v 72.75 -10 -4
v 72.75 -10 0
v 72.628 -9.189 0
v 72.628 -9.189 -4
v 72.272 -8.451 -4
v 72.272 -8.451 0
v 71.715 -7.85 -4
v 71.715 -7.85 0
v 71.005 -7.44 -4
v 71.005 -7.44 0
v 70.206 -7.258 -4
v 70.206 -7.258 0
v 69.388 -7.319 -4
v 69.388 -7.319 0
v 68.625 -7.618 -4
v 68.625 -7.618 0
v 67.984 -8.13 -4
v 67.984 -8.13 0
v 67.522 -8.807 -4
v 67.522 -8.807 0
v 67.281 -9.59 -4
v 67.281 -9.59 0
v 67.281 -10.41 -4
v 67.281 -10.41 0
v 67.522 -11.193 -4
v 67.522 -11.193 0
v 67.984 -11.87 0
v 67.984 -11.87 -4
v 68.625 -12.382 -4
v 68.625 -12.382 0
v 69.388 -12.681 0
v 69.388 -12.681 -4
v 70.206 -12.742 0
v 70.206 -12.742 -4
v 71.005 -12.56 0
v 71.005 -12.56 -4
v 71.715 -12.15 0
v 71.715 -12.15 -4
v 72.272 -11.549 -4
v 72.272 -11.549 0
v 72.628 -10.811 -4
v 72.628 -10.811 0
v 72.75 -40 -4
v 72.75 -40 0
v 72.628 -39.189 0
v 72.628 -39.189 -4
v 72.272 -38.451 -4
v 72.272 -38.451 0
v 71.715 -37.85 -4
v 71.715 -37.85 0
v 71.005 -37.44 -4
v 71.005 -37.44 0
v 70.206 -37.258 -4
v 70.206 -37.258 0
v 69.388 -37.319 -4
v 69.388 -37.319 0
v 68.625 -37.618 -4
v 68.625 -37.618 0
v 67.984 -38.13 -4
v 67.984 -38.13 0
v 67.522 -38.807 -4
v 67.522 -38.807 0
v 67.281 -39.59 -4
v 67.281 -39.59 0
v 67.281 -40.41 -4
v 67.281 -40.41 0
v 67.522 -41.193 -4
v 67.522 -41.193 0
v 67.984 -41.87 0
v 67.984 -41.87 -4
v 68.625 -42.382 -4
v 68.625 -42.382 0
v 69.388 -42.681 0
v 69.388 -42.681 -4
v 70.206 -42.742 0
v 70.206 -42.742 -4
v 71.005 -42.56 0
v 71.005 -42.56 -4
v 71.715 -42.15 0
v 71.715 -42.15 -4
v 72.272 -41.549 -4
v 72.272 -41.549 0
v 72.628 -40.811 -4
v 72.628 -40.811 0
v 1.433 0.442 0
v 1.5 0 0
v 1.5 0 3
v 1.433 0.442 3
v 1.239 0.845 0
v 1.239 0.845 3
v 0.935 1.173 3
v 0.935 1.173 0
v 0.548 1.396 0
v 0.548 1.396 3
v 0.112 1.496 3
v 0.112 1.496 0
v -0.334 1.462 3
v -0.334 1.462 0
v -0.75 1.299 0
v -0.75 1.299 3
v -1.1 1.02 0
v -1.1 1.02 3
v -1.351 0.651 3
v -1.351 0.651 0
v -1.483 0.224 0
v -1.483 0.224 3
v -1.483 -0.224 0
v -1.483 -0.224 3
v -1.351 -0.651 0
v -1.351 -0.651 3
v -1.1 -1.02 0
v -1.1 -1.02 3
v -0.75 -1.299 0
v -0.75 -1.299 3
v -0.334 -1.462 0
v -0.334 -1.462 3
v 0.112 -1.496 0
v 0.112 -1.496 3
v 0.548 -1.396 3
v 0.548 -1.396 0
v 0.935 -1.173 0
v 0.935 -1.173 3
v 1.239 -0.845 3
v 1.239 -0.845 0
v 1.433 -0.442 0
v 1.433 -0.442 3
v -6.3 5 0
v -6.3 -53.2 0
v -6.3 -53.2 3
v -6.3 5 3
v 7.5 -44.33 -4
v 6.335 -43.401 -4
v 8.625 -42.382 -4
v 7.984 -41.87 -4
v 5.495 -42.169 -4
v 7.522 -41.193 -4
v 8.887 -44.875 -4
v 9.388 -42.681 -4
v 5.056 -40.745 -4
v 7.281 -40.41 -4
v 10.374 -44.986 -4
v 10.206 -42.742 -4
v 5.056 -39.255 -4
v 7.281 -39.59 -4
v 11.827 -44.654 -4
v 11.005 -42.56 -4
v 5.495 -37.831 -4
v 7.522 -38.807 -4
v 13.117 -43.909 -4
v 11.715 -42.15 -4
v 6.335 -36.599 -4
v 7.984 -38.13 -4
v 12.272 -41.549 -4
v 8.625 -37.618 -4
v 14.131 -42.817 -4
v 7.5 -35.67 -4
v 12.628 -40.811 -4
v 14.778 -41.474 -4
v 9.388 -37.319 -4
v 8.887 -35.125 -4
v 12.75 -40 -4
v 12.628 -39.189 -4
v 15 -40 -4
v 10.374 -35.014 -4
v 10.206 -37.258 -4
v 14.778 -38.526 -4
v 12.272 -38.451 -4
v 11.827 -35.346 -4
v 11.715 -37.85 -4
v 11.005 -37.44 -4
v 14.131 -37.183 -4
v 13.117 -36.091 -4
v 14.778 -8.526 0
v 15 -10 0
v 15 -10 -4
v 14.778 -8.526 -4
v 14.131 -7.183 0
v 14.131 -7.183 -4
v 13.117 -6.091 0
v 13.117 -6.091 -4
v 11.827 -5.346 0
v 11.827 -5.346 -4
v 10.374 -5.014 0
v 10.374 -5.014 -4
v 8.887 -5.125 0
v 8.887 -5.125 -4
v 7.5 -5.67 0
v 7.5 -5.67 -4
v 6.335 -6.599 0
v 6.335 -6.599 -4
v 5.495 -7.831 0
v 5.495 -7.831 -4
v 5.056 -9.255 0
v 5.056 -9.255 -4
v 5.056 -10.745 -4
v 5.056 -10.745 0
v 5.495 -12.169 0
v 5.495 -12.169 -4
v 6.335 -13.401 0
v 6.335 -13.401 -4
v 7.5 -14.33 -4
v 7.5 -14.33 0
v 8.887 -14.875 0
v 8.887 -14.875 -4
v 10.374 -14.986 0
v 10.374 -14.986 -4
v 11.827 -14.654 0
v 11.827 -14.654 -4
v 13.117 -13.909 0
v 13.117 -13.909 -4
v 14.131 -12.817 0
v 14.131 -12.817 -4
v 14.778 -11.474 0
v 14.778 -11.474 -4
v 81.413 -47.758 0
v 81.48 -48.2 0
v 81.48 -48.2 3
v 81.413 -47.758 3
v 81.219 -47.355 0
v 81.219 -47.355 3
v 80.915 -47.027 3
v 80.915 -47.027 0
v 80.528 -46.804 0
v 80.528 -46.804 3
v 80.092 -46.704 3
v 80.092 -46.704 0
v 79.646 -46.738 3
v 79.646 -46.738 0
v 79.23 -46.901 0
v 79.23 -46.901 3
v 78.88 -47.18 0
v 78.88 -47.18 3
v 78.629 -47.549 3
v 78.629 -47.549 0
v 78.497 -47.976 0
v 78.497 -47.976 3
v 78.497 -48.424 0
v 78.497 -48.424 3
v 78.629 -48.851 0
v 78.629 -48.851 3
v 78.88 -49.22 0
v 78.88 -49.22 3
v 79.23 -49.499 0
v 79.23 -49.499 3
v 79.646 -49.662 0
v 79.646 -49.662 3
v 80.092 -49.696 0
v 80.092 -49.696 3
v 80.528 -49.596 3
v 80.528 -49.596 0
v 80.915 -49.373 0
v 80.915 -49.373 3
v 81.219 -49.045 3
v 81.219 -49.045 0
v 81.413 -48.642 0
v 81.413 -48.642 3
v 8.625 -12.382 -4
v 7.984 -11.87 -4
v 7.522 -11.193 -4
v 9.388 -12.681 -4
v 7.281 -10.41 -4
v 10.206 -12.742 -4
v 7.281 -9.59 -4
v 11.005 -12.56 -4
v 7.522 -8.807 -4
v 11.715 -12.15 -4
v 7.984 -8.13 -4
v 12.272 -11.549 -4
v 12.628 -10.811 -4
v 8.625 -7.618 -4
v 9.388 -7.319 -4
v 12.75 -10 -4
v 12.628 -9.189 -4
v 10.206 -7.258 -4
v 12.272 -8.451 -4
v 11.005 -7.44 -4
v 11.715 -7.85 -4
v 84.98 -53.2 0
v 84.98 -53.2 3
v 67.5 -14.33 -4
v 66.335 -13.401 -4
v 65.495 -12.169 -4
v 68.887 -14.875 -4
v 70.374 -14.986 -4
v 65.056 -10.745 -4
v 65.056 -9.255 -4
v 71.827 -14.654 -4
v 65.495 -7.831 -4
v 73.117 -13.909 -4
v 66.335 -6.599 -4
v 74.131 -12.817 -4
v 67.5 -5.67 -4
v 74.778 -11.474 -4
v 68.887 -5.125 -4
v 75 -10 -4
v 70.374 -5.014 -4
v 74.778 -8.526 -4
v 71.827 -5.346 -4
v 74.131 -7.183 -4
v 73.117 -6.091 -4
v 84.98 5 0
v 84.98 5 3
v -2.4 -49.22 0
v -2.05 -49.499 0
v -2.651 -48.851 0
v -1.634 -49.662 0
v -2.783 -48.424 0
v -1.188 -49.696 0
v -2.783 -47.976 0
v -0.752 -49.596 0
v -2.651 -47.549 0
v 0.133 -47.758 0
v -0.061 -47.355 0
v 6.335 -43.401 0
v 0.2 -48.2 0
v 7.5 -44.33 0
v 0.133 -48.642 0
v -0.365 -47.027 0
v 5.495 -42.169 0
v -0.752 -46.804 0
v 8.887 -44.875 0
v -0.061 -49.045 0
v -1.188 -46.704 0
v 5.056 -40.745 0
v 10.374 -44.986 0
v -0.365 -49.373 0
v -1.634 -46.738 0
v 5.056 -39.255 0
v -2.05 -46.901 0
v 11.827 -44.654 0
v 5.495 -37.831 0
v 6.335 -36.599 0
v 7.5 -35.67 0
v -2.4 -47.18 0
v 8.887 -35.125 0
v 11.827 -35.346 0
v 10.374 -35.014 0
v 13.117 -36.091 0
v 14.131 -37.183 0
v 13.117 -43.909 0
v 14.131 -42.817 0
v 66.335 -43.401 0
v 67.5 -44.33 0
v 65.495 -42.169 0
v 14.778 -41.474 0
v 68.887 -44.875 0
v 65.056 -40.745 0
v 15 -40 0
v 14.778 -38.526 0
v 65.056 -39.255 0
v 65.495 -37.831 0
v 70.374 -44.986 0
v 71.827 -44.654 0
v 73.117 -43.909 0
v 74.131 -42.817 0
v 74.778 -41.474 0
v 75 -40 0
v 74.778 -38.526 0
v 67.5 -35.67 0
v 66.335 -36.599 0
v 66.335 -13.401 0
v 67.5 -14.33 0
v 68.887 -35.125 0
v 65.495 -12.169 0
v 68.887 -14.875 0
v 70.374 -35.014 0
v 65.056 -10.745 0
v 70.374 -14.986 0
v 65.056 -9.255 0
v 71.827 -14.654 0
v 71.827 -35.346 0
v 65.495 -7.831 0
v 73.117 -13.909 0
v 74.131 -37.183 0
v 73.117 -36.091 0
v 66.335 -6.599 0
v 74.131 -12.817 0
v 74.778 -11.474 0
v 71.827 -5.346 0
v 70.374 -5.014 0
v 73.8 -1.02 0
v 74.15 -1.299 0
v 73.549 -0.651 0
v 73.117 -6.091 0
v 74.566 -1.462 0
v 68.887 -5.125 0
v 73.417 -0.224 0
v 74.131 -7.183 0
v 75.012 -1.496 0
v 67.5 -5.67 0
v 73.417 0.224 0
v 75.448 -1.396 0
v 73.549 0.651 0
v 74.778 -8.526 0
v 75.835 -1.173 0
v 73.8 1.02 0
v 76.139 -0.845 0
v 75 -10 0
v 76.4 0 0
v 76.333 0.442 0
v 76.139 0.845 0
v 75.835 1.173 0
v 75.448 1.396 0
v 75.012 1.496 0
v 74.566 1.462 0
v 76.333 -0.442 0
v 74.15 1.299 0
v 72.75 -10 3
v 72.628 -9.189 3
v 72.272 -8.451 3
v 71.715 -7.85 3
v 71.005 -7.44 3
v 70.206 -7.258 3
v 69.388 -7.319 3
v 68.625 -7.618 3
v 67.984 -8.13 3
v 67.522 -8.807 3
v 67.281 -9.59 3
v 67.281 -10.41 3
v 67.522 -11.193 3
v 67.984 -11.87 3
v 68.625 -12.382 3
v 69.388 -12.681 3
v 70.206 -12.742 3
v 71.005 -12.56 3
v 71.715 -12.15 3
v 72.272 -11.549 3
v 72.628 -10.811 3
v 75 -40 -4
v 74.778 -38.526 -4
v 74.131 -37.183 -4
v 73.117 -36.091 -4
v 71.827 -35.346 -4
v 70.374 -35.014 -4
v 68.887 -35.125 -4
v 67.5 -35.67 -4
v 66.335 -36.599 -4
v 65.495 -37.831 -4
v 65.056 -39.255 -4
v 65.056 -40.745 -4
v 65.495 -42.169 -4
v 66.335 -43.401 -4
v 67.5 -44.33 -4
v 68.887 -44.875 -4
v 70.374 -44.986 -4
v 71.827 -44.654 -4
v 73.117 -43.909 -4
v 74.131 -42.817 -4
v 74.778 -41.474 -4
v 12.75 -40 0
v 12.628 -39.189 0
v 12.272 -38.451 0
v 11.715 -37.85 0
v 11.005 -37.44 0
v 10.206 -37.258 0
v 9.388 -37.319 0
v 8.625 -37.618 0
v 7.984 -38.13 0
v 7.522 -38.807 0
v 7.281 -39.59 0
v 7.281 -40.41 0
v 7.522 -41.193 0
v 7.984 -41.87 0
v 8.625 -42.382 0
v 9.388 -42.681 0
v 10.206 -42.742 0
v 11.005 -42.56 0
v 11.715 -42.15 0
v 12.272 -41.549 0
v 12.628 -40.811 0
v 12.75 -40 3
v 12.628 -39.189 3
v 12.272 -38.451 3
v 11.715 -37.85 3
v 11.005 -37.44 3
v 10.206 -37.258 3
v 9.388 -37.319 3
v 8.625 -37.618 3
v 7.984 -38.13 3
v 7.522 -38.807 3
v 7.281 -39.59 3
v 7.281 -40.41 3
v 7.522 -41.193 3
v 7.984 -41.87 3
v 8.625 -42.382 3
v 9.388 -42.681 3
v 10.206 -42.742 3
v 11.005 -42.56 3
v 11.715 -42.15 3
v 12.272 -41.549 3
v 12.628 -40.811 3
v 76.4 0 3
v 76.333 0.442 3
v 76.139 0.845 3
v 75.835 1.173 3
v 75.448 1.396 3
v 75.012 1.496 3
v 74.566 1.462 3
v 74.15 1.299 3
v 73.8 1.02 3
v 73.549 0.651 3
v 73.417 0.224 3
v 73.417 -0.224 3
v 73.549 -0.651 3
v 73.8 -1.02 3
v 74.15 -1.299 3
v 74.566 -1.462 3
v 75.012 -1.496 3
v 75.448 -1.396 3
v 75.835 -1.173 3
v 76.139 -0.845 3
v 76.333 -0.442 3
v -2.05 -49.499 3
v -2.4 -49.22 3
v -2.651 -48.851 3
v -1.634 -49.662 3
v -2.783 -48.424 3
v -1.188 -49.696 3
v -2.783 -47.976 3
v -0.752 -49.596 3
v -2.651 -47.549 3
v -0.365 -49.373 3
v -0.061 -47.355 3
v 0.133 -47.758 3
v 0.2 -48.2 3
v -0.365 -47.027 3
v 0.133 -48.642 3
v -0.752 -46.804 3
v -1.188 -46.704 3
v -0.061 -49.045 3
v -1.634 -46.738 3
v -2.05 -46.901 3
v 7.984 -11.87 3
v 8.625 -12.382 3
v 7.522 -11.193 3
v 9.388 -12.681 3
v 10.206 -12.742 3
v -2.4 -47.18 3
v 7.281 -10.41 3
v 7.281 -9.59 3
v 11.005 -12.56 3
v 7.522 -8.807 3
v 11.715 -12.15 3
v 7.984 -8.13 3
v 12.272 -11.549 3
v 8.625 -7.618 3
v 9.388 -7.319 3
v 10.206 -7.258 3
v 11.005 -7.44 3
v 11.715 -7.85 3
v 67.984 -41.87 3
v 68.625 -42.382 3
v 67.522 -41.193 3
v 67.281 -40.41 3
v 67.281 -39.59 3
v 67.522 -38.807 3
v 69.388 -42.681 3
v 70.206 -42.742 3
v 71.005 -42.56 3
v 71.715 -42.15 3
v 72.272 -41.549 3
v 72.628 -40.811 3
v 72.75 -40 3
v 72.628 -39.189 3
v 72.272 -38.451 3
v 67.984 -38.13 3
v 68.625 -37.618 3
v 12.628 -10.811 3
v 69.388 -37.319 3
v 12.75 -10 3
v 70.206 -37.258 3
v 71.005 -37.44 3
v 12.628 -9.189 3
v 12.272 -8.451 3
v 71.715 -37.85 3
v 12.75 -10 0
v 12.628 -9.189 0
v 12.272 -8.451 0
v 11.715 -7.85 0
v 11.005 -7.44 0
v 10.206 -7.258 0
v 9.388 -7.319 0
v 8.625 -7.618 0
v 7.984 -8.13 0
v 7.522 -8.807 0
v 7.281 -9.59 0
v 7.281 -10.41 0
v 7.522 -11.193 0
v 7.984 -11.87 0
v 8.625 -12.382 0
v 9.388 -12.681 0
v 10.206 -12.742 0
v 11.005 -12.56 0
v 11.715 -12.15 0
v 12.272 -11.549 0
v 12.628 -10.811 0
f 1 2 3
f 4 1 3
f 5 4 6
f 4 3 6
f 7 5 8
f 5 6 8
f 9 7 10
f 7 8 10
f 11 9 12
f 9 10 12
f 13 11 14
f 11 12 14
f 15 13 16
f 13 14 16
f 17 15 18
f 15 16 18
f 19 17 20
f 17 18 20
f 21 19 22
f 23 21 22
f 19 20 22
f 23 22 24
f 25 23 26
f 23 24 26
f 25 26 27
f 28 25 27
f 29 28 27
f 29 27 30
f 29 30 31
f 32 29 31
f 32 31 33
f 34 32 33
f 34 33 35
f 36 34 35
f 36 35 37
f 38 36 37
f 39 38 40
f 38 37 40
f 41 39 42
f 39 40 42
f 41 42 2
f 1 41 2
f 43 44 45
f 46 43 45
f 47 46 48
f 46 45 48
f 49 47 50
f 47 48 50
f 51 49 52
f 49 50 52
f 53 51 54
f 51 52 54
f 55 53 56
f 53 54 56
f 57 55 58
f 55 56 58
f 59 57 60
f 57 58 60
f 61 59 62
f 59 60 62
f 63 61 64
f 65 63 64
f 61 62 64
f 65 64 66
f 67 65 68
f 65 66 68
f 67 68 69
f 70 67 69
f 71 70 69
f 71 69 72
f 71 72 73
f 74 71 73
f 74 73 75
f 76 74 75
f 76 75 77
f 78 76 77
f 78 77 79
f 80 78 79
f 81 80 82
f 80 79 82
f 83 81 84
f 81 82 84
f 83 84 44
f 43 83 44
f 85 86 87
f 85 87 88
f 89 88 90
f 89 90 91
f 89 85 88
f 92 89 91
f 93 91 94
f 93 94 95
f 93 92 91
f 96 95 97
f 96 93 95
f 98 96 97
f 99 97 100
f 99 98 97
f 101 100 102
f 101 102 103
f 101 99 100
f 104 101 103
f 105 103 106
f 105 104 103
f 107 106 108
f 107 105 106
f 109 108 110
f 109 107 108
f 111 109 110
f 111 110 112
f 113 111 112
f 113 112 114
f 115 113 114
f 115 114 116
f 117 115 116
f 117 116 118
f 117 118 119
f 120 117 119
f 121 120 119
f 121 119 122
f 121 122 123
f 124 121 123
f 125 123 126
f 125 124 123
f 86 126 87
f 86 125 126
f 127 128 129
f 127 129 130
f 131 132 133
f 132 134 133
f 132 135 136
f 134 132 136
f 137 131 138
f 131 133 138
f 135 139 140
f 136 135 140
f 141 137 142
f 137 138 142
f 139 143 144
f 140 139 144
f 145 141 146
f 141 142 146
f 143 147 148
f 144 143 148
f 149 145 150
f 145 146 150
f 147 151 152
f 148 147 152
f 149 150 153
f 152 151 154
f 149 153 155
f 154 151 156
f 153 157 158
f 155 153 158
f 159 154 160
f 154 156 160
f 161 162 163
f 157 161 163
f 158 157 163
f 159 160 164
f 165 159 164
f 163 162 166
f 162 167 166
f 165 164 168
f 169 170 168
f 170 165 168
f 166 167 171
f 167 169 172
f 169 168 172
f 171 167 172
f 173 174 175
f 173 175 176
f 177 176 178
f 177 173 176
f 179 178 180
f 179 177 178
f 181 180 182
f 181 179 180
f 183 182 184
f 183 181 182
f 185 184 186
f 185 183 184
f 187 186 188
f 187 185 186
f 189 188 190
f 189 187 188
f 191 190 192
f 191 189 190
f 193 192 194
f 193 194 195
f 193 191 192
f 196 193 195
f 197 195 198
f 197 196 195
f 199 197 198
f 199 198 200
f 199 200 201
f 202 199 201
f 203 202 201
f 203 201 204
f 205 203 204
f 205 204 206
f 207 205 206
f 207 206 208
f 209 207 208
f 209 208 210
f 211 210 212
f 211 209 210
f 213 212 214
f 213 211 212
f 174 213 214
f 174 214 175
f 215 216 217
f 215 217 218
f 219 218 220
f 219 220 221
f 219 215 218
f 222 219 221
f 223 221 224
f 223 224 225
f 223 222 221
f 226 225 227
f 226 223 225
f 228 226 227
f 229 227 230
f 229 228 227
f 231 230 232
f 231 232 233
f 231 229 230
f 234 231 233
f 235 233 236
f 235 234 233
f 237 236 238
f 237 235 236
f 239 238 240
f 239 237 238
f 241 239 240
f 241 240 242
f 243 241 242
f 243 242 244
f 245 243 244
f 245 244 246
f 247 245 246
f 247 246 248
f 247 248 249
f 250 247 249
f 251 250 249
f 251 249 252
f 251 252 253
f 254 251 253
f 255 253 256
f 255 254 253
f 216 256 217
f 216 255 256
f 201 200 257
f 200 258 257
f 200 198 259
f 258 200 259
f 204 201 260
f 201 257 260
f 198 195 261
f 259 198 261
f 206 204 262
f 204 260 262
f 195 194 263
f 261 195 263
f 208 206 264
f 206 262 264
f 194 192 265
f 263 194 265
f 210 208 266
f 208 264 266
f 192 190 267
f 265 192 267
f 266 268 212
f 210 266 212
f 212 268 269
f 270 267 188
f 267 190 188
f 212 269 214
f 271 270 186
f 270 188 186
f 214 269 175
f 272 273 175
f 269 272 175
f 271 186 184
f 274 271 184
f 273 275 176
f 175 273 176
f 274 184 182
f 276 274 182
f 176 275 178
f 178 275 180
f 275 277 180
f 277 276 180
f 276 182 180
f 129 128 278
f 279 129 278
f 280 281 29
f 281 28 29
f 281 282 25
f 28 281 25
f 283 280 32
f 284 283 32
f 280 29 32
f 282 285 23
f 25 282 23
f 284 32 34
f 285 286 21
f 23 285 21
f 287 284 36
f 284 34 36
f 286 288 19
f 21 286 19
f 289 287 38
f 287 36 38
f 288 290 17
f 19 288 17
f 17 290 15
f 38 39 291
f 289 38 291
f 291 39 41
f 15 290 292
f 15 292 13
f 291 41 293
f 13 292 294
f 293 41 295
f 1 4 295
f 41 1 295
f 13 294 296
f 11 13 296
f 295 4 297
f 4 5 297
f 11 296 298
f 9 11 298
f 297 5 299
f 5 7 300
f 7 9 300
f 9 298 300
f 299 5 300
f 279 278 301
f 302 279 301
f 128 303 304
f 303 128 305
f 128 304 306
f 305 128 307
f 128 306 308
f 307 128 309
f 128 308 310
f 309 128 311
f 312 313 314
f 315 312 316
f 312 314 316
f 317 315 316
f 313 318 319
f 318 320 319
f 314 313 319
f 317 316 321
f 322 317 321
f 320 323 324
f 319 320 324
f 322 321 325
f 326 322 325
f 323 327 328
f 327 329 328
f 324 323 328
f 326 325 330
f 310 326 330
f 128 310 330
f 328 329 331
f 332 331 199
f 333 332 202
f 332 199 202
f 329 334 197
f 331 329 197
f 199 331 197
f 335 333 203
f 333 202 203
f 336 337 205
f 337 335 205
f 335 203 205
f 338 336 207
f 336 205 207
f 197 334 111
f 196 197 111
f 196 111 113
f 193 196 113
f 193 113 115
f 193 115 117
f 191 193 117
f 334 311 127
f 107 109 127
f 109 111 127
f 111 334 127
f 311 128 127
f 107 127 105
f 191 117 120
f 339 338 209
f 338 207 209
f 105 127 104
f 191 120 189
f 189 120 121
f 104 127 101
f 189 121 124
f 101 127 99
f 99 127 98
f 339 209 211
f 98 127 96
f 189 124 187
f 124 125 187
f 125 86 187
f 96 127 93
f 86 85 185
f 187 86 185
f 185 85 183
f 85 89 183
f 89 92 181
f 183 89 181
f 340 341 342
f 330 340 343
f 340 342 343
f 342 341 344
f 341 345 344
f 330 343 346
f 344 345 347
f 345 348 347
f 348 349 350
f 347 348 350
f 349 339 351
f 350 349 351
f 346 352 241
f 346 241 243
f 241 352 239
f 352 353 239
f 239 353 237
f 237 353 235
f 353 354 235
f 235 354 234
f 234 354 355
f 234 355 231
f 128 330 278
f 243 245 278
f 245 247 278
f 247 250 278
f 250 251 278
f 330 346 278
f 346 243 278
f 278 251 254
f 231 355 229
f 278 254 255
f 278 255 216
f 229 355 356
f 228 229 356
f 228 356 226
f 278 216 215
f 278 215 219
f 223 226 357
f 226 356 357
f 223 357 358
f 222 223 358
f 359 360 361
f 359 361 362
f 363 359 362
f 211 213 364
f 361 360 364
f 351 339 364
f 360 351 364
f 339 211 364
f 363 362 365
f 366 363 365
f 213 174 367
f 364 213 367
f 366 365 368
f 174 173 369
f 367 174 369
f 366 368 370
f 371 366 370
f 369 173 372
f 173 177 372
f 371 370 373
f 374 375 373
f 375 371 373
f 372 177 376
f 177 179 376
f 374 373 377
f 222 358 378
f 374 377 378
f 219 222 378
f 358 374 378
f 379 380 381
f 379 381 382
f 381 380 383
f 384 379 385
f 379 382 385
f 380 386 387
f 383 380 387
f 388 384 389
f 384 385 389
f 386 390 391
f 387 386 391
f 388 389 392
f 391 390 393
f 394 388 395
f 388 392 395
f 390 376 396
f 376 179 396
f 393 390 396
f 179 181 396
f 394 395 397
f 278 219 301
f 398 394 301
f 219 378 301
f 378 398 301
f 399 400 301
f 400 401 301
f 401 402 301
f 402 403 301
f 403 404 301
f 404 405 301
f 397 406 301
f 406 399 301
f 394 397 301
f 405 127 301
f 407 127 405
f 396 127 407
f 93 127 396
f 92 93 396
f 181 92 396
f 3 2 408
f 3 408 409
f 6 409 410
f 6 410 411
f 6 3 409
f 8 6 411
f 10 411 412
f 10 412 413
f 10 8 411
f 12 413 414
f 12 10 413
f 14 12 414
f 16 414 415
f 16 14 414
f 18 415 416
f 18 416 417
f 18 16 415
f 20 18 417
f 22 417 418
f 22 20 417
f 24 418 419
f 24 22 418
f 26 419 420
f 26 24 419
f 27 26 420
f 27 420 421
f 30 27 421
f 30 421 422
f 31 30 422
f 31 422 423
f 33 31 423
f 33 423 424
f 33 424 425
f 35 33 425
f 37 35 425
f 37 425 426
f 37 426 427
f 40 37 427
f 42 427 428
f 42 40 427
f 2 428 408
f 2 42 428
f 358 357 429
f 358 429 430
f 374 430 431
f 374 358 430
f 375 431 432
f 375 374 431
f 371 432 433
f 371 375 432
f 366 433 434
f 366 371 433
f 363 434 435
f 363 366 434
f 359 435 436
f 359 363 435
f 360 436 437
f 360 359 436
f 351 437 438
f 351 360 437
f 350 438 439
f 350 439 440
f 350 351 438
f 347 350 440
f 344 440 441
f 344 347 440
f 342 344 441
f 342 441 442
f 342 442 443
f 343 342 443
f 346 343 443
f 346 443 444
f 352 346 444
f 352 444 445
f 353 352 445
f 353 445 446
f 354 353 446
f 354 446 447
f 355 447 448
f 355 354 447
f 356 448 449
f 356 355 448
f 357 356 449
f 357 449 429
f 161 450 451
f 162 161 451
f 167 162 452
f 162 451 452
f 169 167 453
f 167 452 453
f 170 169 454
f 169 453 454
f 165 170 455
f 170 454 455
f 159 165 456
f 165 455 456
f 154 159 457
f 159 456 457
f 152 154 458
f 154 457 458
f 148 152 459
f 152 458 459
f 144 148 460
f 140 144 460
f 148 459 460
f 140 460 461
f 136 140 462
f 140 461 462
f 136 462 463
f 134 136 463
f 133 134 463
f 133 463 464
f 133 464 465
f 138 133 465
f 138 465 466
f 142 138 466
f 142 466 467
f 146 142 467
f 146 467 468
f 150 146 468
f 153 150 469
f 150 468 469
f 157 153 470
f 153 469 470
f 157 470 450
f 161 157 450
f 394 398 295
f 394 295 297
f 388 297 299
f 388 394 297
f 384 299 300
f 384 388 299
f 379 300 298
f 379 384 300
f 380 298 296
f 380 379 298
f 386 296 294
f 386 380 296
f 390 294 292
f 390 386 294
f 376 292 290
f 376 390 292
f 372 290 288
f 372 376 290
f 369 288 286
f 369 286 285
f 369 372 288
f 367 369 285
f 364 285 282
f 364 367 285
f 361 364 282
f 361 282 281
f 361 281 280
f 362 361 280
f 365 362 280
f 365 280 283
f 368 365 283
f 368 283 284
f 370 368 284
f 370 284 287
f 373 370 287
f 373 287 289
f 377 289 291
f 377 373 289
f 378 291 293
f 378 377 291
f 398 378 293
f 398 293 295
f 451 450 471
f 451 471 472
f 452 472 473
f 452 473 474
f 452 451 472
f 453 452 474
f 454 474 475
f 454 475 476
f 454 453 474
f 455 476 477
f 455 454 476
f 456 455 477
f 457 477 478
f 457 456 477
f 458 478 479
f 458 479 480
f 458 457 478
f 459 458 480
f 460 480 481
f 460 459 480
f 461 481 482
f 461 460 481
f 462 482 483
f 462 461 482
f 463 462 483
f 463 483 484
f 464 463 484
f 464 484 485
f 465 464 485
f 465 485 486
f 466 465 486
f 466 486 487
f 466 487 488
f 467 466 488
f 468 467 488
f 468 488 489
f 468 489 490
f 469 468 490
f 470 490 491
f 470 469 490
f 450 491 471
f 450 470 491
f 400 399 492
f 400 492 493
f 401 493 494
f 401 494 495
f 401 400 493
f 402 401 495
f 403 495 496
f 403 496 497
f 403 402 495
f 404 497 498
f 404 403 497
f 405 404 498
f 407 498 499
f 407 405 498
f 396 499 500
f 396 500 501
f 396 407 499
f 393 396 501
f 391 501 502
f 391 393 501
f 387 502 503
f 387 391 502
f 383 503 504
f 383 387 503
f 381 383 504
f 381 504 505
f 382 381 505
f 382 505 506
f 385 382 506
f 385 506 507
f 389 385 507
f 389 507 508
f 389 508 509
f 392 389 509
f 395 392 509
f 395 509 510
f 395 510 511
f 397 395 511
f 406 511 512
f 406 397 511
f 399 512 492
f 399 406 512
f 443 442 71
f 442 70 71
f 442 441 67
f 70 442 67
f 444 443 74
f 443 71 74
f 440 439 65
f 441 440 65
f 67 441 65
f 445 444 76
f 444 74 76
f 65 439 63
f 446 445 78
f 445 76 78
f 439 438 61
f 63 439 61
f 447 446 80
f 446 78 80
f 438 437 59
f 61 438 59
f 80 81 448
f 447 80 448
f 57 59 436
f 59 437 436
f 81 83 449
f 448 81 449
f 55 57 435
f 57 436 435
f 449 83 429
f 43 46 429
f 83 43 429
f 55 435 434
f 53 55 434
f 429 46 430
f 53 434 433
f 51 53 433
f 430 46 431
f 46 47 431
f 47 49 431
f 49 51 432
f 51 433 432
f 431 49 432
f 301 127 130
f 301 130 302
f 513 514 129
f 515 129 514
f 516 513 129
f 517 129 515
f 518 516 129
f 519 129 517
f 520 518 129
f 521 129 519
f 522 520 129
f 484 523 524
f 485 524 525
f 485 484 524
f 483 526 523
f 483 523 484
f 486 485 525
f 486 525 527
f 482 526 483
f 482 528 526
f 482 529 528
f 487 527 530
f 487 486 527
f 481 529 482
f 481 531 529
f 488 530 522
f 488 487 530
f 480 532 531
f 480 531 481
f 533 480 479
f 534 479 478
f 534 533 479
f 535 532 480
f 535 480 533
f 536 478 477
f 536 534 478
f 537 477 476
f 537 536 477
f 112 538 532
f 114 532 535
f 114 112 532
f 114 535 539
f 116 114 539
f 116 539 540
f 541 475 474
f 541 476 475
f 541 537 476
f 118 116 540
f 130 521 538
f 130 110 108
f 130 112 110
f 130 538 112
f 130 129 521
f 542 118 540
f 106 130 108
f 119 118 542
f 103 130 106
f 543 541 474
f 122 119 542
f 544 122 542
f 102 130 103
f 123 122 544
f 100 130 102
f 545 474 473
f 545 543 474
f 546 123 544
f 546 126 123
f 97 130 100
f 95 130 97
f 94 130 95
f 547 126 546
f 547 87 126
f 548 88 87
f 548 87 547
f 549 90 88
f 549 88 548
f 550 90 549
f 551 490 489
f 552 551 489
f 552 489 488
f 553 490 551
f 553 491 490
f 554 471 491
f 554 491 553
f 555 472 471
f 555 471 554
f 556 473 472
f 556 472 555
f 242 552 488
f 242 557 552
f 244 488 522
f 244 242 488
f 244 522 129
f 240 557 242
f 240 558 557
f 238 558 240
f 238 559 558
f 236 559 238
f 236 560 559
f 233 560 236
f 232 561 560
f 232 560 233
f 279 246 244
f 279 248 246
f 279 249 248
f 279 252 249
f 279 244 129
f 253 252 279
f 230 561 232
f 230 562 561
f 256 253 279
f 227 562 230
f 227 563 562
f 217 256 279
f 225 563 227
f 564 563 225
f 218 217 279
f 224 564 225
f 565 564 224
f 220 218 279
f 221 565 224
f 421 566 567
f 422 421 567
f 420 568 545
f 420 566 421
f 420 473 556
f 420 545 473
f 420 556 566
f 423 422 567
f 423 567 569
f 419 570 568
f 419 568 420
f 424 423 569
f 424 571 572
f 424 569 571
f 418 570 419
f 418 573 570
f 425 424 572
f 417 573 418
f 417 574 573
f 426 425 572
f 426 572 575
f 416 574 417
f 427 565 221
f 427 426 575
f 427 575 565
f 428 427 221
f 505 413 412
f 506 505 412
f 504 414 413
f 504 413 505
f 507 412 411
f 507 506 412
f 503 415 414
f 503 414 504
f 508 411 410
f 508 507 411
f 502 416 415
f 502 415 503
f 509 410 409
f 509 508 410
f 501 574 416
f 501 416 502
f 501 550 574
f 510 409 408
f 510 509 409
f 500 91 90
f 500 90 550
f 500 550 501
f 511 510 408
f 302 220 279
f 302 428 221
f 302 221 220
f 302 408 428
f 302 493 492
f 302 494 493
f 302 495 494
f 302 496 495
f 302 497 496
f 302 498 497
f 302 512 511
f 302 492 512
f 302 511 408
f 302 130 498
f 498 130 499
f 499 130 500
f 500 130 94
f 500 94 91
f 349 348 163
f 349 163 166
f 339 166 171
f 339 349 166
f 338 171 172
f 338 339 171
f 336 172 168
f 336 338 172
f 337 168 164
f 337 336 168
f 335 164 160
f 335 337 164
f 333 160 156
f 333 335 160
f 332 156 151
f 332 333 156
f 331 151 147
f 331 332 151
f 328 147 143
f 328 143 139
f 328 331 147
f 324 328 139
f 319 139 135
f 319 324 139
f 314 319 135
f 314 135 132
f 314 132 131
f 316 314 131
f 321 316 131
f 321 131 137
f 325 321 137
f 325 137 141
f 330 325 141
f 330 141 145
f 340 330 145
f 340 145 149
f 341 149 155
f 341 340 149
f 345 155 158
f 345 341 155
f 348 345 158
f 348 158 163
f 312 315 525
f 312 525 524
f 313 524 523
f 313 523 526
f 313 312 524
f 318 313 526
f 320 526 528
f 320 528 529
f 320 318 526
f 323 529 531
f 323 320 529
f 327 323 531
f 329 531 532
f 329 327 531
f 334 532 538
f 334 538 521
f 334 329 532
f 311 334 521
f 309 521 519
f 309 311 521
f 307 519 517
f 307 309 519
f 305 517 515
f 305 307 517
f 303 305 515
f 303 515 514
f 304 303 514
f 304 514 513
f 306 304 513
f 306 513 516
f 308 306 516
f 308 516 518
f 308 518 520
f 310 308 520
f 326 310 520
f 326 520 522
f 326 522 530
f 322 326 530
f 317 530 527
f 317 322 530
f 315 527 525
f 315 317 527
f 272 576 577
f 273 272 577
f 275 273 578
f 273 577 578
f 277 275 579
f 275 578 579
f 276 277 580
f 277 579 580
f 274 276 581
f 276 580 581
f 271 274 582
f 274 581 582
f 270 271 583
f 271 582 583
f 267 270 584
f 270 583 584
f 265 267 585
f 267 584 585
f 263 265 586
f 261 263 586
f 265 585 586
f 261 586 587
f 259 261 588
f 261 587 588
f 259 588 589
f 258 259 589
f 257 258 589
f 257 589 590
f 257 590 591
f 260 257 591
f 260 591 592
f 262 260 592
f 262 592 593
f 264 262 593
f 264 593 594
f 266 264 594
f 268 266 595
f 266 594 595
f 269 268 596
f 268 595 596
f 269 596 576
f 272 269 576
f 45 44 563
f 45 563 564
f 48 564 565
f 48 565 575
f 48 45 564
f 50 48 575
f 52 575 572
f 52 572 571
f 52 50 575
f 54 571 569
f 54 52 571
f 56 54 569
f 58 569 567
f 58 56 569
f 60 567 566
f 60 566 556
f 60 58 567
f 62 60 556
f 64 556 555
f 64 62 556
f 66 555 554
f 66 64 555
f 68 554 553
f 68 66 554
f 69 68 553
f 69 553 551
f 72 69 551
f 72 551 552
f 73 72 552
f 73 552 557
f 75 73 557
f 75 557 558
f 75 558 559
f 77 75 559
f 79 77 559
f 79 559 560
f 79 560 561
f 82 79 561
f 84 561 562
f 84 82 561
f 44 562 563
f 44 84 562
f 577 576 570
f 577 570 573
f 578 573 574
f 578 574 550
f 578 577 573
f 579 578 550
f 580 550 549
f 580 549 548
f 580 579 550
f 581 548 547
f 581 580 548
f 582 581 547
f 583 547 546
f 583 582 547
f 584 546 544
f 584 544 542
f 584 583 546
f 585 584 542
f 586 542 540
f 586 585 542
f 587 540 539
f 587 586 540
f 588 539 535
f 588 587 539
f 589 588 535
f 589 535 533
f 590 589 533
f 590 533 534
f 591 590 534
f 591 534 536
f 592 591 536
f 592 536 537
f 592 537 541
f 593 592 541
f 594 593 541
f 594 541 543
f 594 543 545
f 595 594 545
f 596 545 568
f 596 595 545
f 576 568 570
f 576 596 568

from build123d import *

# Parameters (mm, degrees)
SKETCH_W      = 91.28
SKETCH_H      = 58.2
SKETCH_R      = 1.5
SKETCH_R_2    = 2.75
PAD_DEPTH     = 3
SKETCH001_R   = 5
SKETCH001_R_2 = 2.75
PAD001_DEPTH  = 4


with BuildPart() as part:
    # Sketch → Pad (new body)
    with BuildSketch(Plane.XY):
        with Locations((39.34, -24.1)):
            Rectangle(SKETCH_W, SKETCH_H)
        Circle(SKETCH_R, mode=Mode.SUBTRACT)
        with Locations((-1.3, -48.2)):
            Circle(SKETCH_R, mode=Mode.SUBTRACT)
        with Locations((74.9, 0)):
            Circle(SKETCH_R, mode=Mode.SUBTRACT)
        with Locations((79.98, -48.2)):
            Circle(SKETCH_R, mode=Mode.SUBTRACT)
        with Locations((10, -10)):
            Circle(SKETCH_R_2, mode=Mode.SUBTRACT)
        with Locations((70, -10)):
            Circle(SKETCH_R_2, mode=Mode.SUBTRACT)
        with Locations((70, -40)):
            Circle(SKETCH_R_2, mode=Mode.SUBTRACT)
        with Locations((10, -40)):
            Circle(SKETCH_R_2, mode=Mode.SUBTRACT)
    extrude(amount=PAD_DEPTH)

    # Sketch001 → Pad001 (join)
    with BuildSketch(Plane.XY):
        with Locations((10, -10)):
            Circle(SKETCH001_R)
        with Locations((10, -10)):
            Circle(SKETCH001_R_2, mode=Mode.SUBTRACT)
        with Locations((70, -10)):
            Circle(SKETCH001_R)
        with Locations((70, -10)):
            Circle(SKETCH001_R_2, mode=Mode.SUBTRACT)
        with Locations((70, -40)):
            Circle(SKETCH001_R)
        with Locations((70, -40)):
            Circle(SKETCH001_R_2, mode=Mode.SUBTRACT)
        with Locations((10, -40)):
            Circle(SKETCH001_R)
        with Locations((10, -40)):
            Circle(SKETCH001_R_2, mode=Mode.SUBTRACT)
    extrude(amount=-PAD001_DEPTH)


solid = part.part
